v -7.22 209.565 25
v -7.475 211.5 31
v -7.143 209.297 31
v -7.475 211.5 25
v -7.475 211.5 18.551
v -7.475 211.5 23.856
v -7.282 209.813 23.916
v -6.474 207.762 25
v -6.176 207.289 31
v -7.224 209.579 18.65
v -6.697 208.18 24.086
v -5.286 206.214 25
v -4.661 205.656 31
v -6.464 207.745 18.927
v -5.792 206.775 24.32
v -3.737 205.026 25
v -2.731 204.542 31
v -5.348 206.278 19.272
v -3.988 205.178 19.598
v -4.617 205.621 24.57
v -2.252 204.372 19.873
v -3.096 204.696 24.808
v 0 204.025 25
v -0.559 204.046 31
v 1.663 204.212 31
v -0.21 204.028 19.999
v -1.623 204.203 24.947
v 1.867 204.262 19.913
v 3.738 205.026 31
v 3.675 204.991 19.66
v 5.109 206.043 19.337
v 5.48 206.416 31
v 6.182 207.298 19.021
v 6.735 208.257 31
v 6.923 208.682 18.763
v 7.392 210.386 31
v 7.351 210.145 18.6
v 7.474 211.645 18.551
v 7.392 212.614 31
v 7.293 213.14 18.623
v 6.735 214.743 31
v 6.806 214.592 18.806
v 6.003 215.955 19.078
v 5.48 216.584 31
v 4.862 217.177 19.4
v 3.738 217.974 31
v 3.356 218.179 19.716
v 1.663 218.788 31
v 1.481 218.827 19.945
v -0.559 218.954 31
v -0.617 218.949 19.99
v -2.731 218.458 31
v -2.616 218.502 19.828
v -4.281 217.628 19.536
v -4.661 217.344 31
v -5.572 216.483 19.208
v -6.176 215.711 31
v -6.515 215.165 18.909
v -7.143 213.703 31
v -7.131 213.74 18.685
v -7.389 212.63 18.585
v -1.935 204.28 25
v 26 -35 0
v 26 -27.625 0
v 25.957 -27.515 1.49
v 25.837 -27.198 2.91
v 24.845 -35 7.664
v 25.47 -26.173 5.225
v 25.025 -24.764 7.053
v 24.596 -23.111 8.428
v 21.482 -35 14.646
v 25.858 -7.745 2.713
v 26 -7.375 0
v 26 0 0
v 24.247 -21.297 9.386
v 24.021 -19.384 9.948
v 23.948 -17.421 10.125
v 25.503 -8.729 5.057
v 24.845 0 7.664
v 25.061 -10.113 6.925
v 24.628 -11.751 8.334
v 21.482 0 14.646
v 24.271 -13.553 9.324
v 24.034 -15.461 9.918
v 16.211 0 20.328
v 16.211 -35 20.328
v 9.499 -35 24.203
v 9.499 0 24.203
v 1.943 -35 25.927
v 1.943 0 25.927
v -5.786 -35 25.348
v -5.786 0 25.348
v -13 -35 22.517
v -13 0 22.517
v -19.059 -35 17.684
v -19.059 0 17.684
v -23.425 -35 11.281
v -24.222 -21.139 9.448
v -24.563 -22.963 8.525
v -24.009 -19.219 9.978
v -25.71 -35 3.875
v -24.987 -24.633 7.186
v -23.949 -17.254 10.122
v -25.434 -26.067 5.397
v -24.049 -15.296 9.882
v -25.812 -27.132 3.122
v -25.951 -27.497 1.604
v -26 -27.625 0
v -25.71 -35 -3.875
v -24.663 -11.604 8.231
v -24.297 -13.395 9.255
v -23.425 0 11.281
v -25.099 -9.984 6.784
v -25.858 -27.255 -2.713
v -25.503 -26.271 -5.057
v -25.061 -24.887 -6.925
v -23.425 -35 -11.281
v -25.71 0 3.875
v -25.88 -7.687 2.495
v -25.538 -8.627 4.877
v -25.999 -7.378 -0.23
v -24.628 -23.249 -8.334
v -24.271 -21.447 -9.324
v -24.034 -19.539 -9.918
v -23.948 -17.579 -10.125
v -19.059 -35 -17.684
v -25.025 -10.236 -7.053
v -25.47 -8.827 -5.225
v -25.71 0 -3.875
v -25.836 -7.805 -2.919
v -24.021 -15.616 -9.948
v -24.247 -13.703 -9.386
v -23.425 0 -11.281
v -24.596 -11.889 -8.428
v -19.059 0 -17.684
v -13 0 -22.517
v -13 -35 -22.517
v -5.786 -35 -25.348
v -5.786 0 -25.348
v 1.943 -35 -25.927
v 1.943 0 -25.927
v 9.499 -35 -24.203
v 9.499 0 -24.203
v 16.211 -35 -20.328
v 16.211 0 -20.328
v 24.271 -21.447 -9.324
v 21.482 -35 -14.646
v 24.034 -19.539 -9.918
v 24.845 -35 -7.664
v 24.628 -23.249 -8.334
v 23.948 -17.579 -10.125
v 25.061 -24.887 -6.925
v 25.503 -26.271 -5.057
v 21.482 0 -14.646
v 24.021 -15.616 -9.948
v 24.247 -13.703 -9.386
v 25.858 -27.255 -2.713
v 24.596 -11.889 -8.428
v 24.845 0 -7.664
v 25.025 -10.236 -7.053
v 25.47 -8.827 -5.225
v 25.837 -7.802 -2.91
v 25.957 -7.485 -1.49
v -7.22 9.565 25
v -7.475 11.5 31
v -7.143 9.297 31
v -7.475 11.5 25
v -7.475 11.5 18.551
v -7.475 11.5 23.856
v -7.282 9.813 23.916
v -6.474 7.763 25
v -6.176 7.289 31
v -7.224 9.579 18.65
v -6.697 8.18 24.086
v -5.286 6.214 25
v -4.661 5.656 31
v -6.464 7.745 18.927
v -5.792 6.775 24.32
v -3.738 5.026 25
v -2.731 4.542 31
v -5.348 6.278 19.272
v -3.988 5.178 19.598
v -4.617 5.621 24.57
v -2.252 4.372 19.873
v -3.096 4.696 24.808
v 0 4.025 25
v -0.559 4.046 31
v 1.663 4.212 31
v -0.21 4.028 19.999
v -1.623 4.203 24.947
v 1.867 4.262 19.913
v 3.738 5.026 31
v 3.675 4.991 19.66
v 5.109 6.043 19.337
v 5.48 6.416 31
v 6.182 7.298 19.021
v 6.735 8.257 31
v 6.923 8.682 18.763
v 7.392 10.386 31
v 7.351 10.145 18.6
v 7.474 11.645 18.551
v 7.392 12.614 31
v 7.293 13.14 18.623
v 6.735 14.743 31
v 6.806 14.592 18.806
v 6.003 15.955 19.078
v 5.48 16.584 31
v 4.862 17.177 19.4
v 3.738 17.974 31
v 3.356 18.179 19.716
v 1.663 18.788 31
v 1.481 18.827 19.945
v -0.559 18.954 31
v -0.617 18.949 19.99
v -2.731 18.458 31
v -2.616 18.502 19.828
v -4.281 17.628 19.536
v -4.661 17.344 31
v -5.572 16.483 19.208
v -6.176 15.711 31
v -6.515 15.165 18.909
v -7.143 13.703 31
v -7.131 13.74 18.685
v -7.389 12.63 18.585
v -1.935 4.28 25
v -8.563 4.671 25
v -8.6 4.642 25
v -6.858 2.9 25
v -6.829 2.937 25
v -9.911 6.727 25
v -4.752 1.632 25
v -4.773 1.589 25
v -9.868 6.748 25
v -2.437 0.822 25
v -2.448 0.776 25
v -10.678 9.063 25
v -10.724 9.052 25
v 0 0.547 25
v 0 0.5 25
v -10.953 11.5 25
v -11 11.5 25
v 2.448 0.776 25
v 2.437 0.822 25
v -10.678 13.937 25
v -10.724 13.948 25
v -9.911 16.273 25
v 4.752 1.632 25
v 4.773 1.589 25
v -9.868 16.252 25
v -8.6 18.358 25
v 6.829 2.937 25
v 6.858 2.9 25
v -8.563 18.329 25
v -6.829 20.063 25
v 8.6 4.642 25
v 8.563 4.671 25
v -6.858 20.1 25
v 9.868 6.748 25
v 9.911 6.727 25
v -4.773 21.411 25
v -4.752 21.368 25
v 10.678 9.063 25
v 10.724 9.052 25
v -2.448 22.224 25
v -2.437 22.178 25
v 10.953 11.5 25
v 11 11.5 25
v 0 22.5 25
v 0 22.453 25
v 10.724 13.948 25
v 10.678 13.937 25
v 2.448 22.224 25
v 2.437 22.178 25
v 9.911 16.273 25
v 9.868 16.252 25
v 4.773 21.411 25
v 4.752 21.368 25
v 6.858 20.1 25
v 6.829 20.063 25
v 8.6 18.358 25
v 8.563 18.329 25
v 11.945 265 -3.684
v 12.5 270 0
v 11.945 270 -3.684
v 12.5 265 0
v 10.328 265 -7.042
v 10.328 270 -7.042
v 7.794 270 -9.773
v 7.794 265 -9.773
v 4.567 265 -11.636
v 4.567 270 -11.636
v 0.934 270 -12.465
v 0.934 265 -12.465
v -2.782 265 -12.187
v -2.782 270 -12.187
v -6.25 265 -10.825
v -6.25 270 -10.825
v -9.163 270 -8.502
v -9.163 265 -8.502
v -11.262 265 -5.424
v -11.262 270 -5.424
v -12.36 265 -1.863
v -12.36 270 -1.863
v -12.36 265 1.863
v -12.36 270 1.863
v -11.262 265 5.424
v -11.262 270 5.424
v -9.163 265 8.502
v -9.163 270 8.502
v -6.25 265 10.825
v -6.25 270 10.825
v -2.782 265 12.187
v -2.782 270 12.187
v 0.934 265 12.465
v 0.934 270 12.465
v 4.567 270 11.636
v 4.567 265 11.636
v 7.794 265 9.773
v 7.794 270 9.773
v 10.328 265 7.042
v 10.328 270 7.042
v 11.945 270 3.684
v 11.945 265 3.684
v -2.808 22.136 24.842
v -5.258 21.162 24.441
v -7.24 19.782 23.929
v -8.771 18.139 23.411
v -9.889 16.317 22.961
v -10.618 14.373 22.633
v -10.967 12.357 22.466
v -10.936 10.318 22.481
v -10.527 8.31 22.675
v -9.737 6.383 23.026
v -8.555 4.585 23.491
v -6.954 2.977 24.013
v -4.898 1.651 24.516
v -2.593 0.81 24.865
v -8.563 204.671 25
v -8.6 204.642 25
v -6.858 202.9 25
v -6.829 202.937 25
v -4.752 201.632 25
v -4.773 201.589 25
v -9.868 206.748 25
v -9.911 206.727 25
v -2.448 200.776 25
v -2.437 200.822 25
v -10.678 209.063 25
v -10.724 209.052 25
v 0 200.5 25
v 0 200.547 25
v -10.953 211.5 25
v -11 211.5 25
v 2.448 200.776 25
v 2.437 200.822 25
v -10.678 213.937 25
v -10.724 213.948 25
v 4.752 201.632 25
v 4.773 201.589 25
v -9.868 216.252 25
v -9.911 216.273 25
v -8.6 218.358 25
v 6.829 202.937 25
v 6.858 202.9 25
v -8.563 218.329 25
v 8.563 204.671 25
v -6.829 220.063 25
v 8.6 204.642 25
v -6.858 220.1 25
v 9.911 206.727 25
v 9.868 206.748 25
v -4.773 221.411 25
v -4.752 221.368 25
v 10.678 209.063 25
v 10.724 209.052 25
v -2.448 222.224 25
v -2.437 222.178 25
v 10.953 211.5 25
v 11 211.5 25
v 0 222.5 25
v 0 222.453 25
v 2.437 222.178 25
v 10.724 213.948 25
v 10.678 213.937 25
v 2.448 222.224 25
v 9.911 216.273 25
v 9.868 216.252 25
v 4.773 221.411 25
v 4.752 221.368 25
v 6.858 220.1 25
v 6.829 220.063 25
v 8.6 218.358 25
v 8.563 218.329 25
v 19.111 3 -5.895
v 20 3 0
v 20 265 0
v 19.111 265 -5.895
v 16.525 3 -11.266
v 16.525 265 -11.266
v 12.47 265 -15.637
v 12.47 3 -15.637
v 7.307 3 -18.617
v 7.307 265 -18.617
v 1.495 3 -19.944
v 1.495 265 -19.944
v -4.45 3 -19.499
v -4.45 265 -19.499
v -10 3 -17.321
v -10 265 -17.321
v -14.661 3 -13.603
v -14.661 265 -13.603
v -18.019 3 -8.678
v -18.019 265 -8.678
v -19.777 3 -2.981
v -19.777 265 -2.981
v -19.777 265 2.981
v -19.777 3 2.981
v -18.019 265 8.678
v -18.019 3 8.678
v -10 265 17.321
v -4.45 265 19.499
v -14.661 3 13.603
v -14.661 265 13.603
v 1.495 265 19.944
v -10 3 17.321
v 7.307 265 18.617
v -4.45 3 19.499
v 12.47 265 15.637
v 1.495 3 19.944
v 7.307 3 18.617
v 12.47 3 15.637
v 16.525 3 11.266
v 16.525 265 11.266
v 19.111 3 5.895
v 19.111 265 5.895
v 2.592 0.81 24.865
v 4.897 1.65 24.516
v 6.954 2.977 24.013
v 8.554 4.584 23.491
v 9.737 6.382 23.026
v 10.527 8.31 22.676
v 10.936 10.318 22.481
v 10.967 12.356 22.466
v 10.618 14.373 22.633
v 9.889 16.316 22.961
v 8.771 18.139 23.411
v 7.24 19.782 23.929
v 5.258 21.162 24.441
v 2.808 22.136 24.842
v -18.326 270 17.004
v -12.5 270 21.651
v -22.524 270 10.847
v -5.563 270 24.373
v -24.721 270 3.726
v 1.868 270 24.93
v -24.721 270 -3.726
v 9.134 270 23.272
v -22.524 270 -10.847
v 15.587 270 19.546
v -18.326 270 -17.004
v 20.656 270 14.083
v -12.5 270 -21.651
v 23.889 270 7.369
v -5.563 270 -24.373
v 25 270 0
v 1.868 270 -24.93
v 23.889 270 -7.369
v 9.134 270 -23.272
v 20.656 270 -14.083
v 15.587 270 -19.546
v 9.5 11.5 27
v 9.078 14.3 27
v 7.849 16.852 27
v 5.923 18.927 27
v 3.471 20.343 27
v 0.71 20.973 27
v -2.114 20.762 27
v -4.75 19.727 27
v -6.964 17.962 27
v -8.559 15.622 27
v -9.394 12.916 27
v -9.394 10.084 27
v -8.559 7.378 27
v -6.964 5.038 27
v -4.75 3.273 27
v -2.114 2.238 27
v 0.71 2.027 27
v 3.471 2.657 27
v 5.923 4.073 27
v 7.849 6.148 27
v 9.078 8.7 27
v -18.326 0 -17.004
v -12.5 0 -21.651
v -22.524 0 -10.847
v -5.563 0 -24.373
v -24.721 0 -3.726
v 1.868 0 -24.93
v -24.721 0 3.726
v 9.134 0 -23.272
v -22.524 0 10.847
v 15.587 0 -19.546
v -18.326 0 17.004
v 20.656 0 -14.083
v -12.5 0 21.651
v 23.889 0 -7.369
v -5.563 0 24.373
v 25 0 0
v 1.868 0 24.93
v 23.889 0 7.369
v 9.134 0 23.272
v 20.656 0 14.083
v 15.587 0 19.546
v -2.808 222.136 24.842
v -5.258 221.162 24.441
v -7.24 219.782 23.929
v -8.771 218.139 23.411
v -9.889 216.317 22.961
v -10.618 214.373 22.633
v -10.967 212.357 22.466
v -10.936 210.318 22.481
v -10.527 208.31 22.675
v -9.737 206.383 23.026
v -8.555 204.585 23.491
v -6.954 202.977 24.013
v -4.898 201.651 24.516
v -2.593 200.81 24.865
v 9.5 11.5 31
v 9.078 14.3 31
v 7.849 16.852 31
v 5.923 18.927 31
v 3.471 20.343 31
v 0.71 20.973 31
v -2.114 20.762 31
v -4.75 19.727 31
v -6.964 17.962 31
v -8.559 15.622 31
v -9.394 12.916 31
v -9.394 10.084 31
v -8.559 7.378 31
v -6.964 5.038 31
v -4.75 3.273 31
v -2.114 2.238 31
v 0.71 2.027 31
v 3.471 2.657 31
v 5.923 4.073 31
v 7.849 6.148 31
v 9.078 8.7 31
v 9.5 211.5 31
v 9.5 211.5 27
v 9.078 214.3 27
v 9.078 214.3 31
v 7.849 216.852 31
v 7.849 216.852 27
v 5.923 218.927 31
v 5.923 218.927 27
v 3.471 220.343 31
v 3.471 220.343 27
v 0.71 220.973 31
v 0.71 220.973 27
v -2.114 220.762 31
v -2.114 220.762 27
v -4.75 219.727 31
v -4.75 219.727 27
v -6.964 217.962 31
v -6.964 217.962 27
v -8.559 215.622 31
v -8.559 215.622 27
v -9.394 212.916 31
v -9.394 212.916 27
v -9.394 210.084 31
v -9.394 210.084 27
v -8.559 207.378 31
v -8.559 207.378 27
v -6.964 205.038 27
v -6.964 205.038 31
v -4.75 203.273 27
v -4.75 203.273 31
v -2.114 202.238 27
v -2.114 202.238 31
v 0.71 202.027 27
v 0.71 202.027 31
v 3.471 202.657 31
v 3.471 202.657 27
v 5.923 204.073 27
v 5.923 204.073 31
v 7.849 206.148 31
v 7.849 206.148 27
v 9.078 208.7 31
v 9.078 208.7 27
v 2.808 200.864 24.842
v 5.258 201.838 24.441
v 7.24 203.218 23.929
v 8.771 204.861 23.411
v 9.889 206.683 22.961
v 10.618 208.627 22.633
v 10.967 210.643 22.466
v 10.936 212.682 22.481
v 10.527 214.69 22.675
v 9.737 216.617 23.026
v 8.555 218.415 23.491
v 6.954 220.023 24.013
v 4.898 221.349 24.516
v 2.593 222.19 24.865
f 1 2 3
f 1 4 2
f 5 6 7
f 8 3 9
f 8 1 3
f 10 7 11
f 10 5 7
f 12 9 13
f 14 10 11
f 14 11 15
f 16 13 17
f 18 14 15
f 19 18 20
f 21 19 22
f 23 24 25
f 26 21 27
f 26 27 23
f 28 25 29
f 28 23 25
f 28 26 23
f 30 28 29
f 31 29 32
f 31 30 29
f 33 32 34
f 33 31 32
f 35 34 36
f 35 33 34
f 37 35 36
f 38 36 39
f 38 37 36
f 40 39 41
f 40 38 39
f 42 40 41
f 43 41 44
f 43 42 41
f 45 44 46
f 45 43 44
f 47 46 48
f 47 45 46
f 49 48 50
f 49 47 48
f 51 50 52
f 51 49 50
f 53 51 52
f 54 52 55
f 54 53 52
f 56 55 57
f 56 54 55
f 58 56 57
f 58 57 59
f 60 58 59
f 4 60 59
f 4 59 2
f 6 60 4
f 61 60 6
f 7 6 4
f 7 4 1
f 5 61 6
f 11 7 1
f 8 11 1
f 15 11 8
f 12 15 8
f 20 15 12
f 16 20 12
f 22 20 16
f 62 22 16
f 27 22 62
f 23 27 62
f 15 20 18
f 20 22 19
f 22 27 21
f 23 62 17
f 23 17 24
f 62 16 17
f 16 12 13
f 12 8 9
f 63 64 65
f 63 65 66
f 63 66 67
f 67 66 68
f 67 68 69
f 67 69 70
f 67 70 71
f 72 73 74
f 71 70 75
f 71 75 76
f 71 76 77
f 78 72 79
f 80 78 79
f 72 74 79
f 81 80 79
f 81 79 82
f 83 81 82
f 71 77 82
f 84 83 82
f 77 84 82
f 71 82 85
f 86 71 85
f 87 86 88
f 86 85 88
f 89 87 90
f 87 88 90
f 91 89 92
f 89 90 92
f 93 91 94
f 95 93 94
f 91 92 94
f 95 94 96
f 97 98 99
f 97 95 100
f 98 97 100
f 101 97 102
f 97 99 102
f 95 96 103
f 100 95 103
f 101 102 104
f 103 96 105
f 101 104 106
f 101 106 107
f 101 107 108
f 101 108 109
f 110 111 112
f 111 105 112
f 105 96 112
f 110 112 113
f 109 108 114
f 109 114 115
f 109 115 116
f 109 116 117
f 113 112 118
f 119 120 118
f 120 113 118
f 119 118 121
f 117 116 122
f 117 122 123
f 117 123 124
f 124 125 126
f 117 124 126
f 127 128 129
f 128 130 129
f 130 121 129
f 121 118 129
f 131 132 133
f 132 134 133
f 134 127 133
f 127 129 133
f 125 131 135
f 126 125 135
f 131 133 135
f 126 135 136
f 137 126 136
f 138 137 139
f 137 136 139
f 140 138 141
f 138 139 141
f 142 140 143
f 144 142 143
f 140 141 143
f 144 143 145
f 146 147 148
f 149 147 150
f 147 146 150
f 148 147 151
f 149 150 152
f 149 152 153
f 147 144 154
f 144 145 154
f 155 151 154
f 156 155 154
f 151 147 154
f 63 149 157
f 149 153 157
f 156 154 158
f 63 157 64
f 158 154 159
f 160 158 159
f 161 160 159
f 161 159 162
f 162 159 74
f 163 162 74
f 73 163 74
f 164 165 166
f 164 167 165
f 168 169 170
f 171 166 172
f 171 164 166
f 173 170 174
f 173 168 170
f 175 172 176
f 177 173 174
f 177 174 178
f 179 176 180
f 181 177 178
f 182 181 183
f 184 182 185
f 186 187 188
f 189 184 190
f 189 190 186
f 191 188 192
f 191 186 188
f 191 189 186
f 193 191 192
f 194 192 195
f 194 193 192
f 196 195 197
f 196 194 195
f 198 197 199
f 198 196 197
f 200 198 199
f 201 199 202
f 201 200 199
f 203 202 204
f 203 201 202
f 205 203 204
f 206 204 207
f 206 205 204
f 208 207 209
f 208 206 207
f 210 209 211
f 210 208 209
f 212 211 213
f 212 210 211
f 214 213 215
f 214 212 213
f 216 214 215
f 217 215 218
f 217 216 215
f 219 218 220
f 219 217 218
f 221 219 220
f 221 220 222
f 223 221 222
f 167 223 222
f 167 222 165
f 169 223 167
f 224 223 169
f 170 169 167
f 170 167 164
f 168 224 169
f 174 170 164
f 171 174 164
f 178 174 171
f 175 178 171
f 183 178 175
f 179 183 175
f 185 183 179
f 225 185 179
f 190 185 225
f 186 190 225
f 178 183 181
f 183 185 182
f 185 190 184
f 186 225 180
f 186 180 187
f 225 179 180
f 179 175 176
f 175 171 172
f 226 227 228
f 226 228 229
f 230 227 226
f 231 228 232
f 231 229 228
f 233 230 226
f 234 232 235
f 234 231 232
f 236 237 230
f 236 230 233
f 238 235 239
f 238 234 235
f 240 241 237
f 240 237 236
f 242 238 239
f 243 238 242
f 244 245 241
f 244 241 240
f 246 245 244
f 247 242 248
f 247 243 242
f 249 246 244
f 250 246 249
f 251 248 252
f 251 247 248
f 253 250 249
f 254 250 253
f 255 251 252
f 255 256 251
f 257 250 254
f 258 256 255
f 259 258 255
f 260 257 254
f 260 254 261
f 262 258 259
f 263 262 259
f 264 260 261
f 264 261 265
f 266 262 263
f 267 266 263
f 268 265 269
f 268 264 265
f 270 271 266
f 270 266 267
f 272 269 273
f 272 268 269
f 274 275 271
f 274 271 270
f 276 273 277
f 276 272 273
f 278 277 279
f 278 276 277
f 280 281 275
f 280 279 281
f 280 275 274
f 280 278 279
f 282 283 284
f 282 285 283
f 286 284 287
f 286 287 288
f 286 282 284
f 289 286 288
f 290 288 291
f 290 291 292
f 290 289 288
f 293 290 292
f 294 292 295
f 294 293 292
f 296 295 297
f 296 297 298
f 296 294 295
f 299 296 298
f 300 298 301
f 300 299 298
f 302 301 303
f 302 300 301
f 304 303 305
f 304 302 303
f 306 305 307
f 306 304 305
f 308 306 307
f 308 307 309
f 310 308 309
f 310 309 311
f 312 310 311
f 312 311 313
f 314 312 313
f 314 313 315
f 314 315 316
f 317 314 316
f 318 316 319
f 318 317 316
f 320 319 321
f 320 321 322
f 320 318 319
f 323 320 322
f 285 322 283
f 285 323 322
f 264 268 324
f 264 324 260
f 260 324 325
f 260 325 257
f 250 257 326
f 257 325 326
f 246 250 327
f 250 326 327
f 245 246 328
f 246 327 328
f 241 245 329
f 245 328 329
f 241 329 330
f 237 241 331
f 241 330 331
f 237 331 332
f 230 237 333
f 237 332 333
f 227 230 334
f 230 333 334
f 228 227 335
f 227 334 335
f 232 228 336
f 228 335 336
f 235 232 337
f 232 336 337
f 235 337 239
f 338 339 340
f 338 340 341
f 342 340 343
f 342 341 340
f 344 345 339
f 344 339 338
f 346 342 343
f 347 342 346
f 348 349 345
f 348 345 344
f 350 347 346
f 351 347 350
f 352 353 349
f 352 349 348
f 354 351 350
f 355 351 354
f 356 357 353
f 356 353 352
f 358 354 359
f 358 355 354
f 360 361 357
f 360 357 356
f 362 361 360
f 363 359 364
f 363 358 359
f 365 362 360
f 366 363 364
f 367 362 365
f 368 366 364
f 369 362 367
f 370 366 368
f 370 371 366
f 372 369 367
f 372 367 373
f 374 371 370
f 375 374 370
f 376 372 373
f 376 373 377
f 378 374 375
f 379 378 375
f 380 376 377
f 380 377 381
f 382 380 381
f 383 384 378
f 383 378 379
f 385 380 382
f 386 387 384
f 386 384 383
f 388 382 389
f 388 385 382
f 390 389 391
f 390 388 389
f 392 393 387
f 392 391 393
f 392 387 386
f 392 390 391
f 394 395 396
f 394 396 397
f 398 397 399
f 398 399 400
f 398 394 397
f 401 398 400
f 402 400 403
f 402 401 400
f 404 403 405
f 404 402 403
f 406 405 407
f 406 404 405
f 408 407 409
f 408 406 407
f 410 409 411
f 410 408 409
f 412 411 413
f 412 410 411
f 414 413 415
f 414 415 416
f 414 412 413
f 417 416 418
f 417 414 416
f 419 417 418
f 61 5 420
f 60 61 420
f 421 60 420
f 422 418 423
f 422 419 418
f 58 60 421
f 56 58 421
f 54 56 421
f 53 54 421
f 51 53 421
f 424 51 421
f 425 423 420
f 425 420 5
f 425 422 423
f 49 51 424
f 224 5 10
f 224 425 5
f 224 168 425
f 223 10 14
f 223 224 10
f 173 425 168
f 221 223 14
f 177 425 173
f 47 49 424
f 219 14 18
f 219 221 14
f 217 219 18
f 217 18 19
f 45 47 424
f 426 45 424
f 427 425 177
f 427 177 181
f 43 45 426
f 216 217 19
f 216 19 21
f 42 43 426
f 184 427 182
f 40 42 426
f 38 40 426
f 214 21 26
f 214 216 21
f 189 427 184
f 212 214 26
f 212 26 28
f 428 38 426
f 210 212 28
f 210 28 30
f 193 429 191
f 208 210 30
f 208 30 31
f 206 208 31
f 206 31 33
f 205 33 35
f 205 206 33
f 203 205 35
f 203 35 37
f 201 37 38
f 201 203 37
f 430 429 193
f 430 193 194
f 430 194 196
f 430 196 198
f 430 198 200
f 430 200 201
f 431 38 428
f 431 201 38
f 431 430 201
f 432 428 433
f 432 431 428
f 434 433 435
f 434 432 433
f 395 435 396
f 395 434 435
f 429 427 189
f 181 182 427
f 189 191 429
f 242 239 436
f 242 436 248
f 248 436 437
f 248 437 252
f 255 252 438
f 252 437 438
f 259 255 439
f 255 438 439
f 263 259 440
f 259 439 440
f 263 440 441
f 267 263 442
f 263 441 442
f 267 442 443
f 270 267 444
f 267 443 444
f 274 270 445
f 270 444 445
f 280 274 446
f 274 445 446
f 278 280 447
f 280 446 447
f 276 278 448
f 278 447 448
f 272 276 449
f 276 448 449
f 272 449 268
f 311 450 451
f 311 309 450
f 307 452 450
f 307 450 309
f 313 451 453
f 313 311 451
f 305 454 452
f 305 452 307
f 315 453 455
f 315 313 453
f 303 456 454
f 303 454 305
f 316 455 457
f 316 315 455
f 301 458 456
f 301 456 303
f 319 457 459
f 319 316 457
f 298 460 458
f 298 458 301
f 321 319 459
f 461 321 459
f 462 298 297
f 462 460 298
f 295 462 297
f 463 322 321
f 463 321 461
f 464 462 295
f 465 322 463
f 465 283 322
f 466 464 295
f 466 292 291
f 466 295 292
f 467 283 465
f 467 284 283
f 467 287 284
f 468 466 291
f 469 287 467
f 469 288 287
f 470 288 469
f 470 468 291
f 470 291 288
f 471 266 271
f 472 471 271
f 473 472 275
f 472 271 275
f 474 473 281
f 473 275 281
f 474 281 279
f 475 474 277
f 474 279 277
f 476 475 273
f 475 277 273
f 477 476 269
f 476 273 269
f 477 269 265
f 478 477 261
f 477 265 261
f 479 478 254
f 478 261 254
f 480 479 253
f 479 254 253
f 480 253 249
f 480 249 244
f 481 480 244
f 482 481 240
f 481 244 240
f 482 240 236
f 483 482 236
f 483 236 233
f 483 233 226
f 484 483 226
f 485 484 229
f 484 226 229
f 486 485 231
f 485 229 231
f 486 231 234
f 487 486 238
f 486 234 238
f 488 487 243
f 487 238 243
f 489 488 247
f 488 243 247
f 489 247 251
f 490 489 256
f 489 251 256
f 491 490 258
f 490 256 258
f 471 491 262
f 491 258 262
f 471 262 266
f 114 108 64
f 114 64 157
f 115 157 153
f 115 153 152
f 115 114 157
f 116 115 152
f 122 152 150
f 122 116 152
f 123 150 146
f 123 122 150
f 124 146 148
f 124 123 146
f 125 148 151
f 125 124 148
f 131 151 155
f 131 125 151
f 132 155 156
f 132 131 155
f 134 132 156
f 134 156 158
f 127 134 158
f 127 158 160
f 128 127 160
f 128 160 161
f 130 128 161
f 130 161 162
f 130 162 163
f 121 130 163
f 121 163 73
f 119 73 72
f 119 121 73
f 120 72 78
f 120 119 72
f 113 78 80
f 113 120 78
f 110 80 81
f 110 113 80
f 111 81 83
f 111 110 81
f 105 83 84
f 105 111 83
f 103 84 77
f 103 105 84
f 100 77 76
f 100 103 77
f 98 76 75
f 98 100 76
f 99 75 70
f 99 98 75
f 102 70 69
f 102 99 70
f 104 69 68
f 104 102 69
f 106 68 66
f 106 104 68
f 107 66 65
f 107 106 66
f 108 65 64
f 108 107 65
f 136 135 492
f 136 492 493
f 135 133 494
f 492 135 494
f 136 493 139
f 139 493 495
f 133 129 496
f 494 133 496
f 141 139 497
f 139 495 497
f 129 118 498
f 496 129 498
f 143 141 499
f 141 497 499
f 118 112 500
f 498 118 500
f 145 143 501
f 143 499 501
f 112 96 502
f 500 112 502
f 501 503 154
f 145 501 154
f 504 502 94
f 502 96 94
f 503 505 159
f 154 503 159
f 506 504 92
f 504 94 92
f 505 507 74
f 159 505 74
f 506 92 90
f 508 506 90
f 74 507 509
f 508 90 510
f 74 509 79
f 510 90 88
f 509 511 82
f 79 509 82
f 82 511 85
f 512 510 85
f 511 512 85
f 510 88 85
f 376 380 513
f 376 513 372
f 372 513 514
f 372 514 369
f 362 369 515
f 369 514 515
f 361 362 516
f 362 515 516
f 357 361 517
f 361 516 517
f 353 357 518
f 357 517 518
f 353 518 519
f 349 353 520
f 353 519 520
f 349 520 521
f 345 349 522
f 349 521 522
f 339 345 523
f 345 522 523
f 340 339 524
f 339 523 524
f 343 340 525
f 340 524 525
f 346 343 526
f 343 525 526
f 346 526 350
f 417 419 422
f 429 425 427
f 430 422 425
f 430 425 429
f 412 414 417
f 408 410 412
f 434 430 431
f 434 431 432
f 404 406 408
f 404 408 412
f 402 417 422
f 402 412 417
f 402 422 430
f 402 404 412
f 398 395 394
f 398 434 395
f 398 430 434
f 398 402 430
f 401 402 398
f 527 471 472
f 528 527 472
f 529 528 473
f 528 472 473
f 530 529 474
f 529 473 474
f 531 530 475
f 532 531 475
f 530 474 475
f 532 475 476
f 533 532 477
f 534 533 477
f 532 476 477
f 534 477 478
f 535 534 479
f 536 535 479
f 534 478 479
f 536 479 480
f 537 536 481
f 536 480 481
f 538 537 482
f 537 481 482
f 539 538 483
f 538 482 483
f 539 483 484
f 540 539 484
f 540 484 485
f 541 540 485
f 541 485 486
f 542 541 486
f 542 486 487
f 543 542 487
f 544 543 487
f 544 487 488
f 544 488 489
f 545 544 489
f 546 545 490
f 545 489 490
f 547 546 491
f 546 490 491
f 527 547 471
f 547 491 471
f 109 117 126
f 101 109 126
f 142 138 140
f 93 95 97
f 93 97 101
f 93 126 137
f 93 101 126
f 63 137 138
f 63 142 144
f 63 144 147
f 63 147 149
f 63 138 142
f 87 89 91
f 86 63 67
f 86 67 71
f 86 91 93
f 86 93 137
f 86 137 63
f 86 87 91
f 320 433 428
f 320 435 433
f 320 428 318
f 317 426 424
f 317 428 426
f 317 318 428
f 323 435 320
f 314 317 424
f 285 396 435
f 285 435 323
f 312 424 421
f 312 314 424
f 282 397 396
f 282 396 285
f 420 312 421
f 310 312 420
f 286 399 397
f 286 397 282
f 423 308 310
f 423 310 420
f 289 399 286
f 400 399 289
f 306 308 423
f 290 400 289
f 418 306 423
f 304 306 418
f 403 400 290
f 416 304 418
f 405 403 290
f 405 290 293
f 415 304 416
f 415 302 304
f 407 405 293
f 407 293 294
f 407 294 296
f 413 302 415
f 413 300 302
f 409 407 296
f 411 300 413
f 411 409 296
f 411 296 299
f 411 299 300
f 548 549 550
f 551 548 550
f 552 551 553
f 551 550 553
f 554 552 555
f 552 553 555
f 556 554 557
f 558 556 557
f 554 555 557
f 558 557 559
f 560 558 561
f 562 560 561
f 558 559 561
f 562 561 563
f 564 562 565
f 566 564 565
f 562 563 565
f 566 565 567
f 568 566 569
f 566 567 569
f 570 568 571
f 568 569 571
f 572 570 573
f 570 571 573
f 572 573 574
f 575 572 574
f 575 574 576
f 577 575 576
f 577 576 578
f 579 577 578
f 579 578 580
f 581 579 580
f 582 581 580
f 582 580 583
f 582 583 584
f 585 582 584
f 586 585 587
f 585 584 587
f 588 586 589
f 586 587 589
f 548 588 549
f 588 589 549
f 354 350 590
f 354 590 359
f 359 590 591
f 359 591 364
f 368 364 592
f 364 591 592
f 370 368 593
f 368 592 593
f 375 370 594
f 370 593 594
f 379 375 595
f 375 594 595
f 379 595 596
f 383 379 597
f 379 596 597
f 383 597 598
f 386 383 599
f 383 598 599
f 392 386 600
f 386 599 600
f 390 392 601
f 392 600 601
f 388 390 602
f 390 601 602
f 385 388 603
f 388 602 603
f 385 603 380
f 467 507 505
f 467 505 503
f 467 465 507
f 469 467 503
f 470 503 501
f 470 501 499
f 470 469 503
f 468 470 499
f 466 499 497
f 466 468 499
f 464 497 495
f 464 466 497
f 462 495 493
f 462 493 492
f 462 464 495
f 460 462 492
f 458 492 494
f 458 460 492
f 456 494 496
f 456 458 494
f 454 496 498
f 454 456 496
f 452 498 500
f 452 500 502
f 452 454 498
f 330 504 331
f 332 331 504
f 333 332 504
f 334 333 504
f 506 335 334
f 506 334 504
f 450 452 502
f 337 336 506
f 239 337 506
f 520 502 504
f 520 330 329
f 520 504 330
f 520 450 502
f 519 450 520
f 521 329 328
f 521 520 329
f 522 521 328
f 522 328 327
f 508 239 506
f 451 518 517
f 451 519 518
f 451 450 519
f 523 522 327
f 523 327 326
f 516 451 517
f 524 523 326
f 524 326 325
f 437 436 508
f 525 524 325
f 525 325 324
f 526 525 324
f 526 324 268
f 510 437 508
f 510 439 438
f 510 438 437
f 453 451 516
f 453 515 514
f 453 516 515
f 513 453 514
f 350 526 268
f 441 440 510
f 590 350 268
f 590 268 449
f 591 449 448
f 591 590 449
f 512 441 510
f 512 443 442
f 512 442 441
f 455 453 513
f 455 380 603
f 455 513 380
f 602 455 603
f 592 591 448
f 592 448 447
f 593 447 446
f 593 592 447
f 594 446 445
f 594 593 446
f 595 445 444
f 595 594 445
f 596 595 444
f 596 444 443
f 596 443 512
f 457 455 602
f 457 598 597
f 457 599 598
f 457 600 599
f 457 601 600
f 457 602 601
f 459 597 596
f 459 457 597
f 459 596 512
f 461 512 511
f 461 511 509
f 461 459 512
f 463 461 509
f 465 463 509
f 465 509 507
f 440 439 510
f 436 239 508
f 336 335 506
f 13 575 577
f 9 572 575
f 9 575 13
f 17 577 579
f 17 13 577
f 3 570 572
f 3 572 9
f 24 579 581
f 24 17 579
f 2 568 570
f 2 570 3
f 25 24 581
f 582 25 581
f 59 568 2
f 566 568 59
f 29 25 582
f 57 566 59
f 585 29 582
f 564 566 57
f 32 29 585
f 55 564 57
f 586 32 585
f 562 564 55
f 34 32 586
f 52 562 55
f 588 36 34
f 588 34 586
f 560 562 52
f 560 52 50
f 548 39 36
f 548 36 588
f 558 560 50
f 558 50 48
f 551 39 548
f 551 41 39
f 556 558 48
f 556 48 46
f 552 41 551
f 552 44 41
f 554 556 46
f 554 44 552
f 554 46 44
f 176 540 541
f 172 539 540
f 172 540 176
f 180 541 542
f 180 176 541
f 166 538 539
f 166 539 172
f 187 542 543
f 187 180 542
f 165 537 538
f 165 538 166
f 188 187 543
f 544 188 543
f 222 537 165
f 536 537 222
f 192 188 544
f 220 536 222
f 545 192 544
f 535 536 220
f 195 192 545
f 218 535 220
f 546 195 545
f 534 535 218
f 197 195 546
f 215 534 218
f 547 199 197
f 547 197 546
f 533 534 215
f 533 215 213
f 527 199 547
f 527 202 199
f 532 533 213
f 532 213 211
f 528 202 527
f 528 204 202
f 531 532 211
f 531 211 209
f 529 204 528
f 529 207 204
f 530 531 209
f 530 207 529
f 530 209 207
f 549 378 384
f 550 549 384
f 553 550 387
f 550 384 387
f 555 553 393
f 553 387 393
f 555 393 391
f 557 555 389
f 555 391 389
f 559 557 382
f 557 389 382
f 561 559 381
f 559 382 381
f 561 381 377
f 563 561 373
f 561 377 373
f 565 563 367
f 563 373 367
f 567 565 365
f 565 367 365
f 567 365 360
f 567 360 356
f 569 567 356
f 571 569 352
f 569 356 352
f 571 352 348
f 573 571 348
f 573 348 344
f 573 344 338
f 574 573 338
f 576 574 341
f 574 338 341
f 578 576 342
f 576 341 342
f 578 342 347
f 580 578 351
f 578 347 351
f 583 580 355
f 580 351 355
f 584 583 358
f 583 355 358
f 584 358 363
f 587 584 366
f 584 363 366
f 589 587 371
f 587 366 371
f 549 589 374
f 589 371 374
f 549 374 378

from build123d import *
from OCP.BRepFilletAPI import BRepFilletAPI_MakeChamfer

# Parameters (mm, degrees)
ESQUISSE2_R                  = 26
BOSS_EXTRU_1_DEPTH           = 35
ESQUISSE3_R                  = 7.475
ENL_V_MAT_EXTRU_2_DEPTH      = 273.492201723
ENL_V_MAT_EXTRU_3_DEPTH      = 273.492201822
ENL_V_MAT_EXTRU_3_DEPTH_BACK = 273.492201822
ESQUISSE4_R                  = 10.125
BOSS_EXTRU_2_START           = -2.550056
ESQUISSE5_R                  = 11
ESQUISSE5_R_2                = 7.475
BOSS_EXTRU_2_DEPTH           = 2.550056
ESQUISSE6_R                  = 9.5
ESQUISSE6_R_2                = 7.475
BOSS_EXTRU_3_DEPTH           = 6
CHANFREIN2_SIZE              = 2
CHANFREIN2_SIZE2             = 1.453085056


with BuildPart() as part:
    # Esquisse1 → Révolution1 (revolve)
    with BuildSketch(Plane.XY):
        Polygon((0, 0), (25, 0), (25, 270), (12.5, 270), (12.5, 265), (20, 265), (20, 3), (0, 3), align=None)
    revolve(axis=Axis((0, 3, 0), (0, 1, 0)))

    # Esquisse2 → Boss.-Extru.1 (add)
    with BuildSketch(Plane(origin=(0, 0, 0), x_dir=(-1, 0, 0), z_dir=(0, -1, 0))):
        with Locations(Location((0, 0, 0), (0, 0, 180))):
            Circle(ESQUISSE2_R)
    extrude(amount=BOSS_EXTRU_1_DEPTH)

    # Esquisse3 → Enlèv. mat.-Extru.2 (cut, through all)
    with BuildSketch(Plane.XY):
        with Locations(Location((0, 11.5, 0), (0, 0, 180))):
            Circle(ESQUISSE3_R)
        with Locations(Location((0, 211.5, 0), (0, 0, 180))):
            Circle(ESQUISSE3_R)
    extrude(amount=ENL_V_MAT_EXTRU_2_DEPTH, mode=Mode.SUBTRACT)

    # Esquisse4 → Enlèv. mat.-Extru.3 (cut, two sides: drawn at the far end of the back side and taken through both)
    with BuildSketch(Plane(origin=(0, 0, 0), x_dir=(0, 0, -1), z_dir=(1, 0, 0)).offset(-ENL_V_MAT_EXTRU_3_DEPTH_BACK)):
        with Locations(Location((0, -17.5, 0), (0, 0, 270))):
            Circle(ESQUISSE4_R)
    extrude(amount=ENL_V_MAT_EXTRU_3_DEPTH + ENL_V_MAT_EXTRU_3_DEPTH_BACK, mode=Mode.SUBTRACT)

    # Esquisse5 → Boss.-Extru.2 (add)
    # profile 1 of 2: a face of its own
    with BuildSketch(Plane.XY.offset(25).offset(BOSS_EXTRU_2_START)):
        with Locations((0, 211.5)):
            Circle(ESQUISSE5_R)
        with Locations(Location((0, 211.5, 0), (0, 0, 180))):
            Circle(ESQUISSE5_R_2, mode=Mode.SUBTRACT)
    # profile 2 of 2: a face of its own
    with BuildSketch(Plane.XY.offset(25).offset(BOSS_EXTRU_2_START)):
        with Locations((0, 11.5)):
            Circle(ESQUISSE5_R)
        with Locations(Location((0, 11.5, 0), (0, 0, 180))):
            Circle(ESQUISSE5_R_2, mode=Mode.SUBTRACT)
    extrude(amount=BOSS_EXTRU_2_DEPTH)

    # Esquisse6 → Boss.-Extru.3 (add)
    # profile 1 of 2: a face of its own
    with BuildSketch(Plane.XY.offset(25)):
        with Locations((0, 211.5)):
            Circle(ESQUISSE6_R)
        with Locations(Location((0, 211.5, 0), (0, 0, 180))):
            Circle(ESQUISSE6_R_2, mode=Mode.SUBTRACT)
    # profile 2 of 2: a face of its own
    with BuildSketch(Plane.XY.offset(25)):
        with Locations((0, 11.5)):
            Circle(ESQUISSE6_R)
        with Locations(Location((0, 11.5, 0), (0, 0, 180))):
            Circle(ESQUISSE6_R_2, mode=Mode.SUBTRACT)
    extrude(amount=BOSS_EXTRU_3_DEPTH)

    # Chanfrein2: one chamfer whose edges measure the first distance from different faces: ONE call of the kernel's chamfer builder (chamfer() names one face for all edges)
    chanfrein2_edges_1 = [part.edges().sort_by_distance(p)[0] for p in [
        (6.717514421, 204.782485579, 25),
    ]]
    chanfrein2_side_1 = [part.faces().sort_by_distance(p)[0] for p in [
        (-9.5, 211.5, 28),
    ]]
    chanfrein2_edges_2 = [part.edges().sort_by_distance(p)[0] for p in [
        (6.717514421, 4.782485579, 25),
    ]]
    chanfrein2_side_2 = [part.faces().sort_by_distance(p)[0] for p in [
        (-9.5, 11.5, 28),
    ]]
    chanfrein2 = BRepFilletAPI_MakeChamfer(part.part.solid().wrapped)
    for e in chanfrein2_edges_1:
        chanfrein2.Add(CHANFREIN2_SIZE, CHANFREIN2_SIZE2, e.wrapped, chanfrein2_side_1[0].wrapped)  # the first distance lies on this face
    for e in chanfrein2_edges_2:
        chanfrein2.Add(CHANFREIN2_SIZE, CHANFREIN2_SIZE2, e.wrapped, chanfrein2_side_2[0].wrapped)  # the first distance lies on this face
    add(Compound.cast(chanfrein2.Shape()), mode=Mode.REPLACE)


solid = part.part
